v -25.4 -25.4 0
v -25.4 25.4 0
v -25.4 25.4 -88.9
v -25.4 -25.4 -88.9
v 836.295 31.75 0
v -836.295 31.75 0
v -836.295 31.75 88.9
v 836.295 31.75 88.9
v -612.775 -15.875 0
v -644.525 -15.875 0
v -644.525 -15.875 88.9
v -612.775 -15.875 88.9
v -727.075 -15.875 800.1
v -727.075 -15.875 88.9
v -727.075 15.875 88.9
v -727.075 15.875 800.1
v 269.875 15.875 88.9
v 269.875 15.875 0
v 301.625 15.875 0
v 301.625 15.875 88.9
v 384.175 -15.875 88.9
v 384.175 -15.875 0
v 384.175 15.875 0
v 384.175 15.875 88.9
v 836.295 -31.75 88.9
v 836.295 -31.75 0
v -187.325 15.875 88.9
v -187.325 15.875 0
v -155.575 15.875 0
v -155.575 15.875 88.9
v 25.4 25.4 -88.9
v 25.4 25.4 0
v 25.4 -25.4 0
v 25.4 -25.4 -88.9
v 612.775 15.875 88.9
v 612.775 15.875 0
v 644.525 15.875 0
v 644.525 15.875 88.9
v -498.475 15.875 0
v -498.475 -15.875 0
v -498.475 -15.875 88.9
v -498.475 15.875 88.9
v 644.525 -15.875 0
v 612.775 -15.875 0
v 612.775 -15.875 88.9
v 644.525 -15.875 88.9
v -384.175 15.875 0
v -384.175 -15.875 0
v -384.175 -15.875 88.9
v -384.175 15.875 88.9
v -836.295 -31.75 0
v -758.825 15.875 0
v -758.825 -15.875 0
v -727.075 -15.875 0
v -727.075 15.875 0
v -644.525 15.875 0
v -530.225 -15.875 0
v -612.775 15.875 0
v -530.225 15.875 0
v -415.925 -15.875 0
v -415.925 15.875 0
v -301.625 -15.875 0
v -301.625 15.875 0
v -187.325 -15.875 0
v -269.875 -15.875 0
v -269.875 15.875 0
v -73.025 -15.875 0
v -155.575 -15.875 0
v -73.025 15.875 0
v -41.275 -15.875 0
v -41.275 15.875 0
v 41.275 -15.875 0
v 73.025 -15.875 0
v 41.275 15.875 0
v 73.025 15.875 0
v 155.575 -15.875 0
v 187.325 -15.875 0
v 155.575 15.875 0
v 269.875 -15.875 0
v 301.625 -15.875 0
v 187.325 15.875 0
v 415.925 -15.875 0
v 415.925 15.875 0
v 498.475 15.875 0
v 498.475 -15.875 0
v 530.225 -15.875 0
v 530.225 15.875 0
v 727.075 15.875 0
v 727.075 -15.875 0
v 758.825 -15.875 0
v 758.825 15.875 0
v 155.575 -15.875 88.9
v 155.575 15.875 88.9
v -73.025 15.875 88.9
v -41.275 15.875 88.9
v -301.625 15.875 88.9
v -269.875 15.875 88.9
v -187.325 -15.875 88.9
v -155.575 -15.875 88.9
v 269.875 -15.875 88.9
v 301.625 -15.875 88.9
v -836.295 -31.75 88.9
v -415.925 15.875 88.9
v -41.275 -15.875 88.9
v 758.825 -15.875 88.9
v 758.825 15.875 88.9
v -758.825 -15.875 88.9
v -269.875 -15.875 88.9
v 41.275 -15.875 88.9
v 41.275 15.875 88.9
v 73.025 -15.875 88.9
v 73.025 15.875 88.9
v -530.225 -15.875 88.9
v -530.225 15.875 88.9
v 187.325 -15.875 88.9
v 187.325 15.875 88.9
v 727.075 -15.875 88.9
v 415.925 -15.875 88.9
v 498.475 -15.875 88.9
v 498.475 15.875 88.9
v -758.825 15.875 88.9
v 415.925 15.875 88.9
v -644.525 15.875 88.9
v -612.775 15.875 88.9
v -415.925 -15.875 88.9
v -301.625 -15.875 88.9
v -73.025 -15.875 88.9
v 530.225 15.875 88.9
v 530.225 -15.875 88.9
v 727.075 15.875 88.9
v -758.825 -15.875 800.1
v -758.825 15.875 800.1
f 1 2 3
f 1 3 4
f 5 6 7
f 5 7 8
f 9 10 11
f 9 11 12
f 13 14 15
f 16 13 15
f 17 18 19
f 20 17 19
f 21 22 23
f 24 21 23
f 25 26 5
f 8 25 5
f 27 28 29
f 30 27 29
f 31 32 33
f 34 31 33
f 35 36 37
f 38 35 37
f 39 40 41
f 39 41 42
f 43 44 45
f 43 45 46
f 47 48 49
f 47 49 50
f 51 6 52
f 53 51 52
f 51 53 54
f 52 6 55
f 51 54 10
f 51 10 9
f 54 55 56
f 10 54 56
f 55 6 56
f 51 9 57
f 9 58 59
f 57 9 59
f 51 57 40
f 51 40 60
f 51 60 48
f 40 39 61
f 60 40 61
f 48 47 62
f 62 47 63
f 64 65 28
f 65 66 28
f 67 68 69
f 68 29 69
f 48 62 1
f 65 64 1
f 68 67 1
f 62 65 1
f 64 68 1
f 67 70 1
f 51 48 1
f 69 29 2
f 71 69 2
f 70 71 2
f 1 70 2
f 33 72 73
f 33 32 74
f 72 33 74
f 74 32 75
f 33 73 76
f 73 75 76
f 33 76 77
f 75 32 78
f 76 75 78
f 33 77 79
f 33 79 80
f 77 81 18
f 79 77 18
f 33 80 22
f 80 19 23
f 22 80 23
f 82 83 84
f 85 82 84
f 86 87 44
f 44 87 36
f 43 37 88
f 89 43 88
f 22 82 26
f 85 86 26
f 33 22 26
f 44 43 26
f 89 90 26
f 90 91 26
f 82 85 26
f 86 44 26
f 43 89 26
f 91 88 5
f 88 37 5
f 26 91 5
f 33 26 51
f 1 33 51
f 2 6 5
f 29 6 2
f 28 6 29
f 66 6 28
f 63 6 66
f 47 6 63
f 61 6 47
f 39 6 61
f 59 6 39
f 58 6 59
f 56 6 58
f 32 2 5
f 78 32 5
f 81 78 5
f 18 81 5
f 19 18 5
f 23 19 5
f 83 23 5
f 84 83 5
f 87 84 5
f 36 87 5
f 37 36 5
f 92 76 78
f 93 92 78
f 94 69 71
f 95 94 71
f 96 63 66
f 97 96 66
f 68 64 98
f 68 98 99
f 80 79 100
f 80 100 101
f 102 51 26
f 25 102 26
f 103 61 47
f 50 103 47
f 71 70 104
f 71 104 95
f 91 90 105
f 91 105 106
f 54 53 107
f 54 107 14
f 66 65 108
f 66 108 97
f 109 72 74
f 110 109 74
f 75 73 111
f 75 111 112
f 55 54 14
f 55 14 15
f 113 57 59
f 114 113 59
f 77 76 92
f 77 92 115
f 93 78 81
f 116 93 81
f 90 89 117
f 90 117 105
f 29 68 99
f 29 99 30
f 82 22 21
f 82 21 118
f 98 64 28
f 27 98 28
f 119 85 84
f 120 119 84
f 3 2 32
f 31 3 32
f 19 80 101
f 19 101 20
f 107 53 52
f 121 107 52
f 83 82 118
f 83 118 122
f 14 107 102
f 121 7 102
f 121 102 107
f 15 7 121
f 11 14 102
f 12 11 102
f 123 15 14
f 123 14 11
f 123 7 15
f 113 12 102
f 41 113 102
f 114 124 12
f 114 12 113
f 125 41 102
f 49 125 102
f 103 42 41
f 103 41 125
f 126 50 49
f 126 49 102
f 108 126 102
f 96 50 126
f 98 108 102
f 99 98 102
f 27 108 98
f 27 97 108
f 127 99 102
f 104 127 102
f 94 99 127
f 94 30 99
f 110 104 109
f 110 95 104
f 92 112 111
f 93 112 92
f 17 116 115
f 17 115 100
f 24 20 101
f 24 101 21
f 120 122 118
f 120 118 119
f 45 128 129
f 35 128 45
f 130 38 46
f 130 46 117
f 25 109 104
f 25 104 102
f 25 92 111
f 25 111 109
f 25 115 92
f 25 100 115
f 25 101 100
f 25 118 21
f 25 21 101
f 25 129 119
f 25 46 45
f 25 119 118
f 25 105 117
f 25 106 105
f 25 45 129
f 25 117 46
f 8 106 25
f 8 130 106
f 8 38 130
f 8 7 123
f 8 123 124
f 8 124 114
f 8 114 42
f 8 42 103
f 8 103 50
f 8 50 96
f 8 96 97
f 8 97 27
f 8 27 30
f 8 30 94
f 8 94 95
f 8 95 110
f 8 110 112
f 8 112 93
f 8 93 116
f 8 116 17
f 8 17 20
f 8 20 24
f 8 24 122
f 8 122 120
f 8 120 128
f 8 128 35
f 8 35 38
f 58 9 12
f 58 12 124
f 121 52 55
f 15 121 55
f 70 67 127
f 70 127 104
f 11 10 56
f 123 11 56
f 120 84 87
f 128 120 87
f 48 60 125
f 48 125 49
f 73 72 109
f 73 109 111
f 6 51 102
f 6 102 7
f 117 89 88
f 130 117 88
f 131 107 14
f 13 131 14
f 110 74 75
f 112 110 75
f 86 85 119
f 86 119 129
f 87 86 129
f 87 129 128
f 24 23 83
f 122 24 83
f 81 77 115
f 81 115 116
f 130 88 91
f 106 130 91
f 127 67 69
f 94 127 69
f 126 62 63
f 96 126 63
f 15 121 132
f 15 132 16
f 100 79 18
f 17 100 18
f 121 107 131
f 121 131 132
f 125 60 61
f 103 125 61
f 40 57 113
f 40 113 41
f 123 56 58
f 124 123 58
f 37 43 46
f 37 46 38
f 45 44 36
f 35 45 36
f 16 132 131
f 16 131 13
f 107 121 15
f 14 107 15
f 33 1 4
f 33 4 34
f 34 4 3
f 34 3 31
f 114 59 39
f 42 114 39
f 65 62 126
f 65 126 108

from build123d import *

# Parameters (mm, degrees)
F0_W     = 1672.59
F0_H     = 63.5
F0_W_2   = 31.75
F0_H_2   = 31.75
F1_DEPTH = 88.9
F3_W     = 50.8
F3_H     = 50.8
F4_DEPTH = 88.9
F2_W     = 31.75
F2_H     = 31.75
F5_DEPTH = 711.2


with BuildPart() as f1:
    # F0 (on Top) → F1 (new body)
    with BuildSketch(Plane.XY):
        Rectangle(F0_W, F0_H)
        with Locations((-742.95, 0)):
            Rectangle(F0_W_2, F0_H_2, mode=Mode.SUBTRACT)
        with Locations((-628.65, 0)):
            Rectangle(F0_W_2, F0_H_2, mode=Mode.SUBTRACT)
        with Locations((-514.35, 0)):
            Rectangle(F0_W_2, F0_H_2, mode=Mode.SUBTRACT)
        with Locations((-400.05, 0)):
            Rectangle(F0_W_2, F0_H_2, mode=Mode.SUBTRACT)
        with Locations((-285.75, 0)):
            Rectangle(F0_W_2, F0_H_2, mode=Mode.SUBTRACT)
        with Locations((-171.45, 0)):
            Rectangle(F0_W_2, F0_H_2, mode=Mode.SUBTRACT)
        with Locations((-57.15, 0)):
            Rectangle(F0_W_2, F0_H_2, mode=Mode.SUBTRACT)
        with Locations((57.15, 0)):
            Rectangle(F0_W_2, F0_H_2, mode=Mode.SUBTRACT)
        with Locations((171.45, 0)):
            Rectangle(F0_W_2, F0_H_2, mode=Mode.SUBTRACT)
        with Locations((285.75, 0)):
            Rectangle(F0_W_2, F0_H_2, mode=Mode.SUBTRACT)
        with Locations((400.05, 0)):
            Rectangle(F0_W_2, F0_H_2, mode=Mode.SUBTRACT)
        with Locations((514.35, 0)):
            Rectangle(F0_W_2, F0_H_2, mode=Mode.SUBTRACT)
        with Locations((628.65, 0)):
            Rectangle(F0_W_2, F0_H_2, mode=Mode.SUBTRACT)
        with Locations((742.95, 0)):
            Rectangle(F0_W_2, F0_H_2, mode=Mode.SUBTRACT)
    extrude(amount=F1_DEPTH)

    # F3 (on face) → F4 (join)
    with BuildSketch(Plane(origin=(0, 0, 0), x_dir=(1, 0, 0), z_dir=(0, 0, -1))):
        Rectangle(F3_W, F3_H)
    extrude(amount=F4_DEPTH)


with BuildPart() as f5:
    # F2 (on face) → F5 (new body)
    with BuildSketch(Plane.XY.offset(88.9)):
        with Locations((-742.95, 0)):
            Rectangle(F2_W, F2_H)
    extrude(amount=F5_DEPTH)


solid = Compound([f1.part, f5.part])
